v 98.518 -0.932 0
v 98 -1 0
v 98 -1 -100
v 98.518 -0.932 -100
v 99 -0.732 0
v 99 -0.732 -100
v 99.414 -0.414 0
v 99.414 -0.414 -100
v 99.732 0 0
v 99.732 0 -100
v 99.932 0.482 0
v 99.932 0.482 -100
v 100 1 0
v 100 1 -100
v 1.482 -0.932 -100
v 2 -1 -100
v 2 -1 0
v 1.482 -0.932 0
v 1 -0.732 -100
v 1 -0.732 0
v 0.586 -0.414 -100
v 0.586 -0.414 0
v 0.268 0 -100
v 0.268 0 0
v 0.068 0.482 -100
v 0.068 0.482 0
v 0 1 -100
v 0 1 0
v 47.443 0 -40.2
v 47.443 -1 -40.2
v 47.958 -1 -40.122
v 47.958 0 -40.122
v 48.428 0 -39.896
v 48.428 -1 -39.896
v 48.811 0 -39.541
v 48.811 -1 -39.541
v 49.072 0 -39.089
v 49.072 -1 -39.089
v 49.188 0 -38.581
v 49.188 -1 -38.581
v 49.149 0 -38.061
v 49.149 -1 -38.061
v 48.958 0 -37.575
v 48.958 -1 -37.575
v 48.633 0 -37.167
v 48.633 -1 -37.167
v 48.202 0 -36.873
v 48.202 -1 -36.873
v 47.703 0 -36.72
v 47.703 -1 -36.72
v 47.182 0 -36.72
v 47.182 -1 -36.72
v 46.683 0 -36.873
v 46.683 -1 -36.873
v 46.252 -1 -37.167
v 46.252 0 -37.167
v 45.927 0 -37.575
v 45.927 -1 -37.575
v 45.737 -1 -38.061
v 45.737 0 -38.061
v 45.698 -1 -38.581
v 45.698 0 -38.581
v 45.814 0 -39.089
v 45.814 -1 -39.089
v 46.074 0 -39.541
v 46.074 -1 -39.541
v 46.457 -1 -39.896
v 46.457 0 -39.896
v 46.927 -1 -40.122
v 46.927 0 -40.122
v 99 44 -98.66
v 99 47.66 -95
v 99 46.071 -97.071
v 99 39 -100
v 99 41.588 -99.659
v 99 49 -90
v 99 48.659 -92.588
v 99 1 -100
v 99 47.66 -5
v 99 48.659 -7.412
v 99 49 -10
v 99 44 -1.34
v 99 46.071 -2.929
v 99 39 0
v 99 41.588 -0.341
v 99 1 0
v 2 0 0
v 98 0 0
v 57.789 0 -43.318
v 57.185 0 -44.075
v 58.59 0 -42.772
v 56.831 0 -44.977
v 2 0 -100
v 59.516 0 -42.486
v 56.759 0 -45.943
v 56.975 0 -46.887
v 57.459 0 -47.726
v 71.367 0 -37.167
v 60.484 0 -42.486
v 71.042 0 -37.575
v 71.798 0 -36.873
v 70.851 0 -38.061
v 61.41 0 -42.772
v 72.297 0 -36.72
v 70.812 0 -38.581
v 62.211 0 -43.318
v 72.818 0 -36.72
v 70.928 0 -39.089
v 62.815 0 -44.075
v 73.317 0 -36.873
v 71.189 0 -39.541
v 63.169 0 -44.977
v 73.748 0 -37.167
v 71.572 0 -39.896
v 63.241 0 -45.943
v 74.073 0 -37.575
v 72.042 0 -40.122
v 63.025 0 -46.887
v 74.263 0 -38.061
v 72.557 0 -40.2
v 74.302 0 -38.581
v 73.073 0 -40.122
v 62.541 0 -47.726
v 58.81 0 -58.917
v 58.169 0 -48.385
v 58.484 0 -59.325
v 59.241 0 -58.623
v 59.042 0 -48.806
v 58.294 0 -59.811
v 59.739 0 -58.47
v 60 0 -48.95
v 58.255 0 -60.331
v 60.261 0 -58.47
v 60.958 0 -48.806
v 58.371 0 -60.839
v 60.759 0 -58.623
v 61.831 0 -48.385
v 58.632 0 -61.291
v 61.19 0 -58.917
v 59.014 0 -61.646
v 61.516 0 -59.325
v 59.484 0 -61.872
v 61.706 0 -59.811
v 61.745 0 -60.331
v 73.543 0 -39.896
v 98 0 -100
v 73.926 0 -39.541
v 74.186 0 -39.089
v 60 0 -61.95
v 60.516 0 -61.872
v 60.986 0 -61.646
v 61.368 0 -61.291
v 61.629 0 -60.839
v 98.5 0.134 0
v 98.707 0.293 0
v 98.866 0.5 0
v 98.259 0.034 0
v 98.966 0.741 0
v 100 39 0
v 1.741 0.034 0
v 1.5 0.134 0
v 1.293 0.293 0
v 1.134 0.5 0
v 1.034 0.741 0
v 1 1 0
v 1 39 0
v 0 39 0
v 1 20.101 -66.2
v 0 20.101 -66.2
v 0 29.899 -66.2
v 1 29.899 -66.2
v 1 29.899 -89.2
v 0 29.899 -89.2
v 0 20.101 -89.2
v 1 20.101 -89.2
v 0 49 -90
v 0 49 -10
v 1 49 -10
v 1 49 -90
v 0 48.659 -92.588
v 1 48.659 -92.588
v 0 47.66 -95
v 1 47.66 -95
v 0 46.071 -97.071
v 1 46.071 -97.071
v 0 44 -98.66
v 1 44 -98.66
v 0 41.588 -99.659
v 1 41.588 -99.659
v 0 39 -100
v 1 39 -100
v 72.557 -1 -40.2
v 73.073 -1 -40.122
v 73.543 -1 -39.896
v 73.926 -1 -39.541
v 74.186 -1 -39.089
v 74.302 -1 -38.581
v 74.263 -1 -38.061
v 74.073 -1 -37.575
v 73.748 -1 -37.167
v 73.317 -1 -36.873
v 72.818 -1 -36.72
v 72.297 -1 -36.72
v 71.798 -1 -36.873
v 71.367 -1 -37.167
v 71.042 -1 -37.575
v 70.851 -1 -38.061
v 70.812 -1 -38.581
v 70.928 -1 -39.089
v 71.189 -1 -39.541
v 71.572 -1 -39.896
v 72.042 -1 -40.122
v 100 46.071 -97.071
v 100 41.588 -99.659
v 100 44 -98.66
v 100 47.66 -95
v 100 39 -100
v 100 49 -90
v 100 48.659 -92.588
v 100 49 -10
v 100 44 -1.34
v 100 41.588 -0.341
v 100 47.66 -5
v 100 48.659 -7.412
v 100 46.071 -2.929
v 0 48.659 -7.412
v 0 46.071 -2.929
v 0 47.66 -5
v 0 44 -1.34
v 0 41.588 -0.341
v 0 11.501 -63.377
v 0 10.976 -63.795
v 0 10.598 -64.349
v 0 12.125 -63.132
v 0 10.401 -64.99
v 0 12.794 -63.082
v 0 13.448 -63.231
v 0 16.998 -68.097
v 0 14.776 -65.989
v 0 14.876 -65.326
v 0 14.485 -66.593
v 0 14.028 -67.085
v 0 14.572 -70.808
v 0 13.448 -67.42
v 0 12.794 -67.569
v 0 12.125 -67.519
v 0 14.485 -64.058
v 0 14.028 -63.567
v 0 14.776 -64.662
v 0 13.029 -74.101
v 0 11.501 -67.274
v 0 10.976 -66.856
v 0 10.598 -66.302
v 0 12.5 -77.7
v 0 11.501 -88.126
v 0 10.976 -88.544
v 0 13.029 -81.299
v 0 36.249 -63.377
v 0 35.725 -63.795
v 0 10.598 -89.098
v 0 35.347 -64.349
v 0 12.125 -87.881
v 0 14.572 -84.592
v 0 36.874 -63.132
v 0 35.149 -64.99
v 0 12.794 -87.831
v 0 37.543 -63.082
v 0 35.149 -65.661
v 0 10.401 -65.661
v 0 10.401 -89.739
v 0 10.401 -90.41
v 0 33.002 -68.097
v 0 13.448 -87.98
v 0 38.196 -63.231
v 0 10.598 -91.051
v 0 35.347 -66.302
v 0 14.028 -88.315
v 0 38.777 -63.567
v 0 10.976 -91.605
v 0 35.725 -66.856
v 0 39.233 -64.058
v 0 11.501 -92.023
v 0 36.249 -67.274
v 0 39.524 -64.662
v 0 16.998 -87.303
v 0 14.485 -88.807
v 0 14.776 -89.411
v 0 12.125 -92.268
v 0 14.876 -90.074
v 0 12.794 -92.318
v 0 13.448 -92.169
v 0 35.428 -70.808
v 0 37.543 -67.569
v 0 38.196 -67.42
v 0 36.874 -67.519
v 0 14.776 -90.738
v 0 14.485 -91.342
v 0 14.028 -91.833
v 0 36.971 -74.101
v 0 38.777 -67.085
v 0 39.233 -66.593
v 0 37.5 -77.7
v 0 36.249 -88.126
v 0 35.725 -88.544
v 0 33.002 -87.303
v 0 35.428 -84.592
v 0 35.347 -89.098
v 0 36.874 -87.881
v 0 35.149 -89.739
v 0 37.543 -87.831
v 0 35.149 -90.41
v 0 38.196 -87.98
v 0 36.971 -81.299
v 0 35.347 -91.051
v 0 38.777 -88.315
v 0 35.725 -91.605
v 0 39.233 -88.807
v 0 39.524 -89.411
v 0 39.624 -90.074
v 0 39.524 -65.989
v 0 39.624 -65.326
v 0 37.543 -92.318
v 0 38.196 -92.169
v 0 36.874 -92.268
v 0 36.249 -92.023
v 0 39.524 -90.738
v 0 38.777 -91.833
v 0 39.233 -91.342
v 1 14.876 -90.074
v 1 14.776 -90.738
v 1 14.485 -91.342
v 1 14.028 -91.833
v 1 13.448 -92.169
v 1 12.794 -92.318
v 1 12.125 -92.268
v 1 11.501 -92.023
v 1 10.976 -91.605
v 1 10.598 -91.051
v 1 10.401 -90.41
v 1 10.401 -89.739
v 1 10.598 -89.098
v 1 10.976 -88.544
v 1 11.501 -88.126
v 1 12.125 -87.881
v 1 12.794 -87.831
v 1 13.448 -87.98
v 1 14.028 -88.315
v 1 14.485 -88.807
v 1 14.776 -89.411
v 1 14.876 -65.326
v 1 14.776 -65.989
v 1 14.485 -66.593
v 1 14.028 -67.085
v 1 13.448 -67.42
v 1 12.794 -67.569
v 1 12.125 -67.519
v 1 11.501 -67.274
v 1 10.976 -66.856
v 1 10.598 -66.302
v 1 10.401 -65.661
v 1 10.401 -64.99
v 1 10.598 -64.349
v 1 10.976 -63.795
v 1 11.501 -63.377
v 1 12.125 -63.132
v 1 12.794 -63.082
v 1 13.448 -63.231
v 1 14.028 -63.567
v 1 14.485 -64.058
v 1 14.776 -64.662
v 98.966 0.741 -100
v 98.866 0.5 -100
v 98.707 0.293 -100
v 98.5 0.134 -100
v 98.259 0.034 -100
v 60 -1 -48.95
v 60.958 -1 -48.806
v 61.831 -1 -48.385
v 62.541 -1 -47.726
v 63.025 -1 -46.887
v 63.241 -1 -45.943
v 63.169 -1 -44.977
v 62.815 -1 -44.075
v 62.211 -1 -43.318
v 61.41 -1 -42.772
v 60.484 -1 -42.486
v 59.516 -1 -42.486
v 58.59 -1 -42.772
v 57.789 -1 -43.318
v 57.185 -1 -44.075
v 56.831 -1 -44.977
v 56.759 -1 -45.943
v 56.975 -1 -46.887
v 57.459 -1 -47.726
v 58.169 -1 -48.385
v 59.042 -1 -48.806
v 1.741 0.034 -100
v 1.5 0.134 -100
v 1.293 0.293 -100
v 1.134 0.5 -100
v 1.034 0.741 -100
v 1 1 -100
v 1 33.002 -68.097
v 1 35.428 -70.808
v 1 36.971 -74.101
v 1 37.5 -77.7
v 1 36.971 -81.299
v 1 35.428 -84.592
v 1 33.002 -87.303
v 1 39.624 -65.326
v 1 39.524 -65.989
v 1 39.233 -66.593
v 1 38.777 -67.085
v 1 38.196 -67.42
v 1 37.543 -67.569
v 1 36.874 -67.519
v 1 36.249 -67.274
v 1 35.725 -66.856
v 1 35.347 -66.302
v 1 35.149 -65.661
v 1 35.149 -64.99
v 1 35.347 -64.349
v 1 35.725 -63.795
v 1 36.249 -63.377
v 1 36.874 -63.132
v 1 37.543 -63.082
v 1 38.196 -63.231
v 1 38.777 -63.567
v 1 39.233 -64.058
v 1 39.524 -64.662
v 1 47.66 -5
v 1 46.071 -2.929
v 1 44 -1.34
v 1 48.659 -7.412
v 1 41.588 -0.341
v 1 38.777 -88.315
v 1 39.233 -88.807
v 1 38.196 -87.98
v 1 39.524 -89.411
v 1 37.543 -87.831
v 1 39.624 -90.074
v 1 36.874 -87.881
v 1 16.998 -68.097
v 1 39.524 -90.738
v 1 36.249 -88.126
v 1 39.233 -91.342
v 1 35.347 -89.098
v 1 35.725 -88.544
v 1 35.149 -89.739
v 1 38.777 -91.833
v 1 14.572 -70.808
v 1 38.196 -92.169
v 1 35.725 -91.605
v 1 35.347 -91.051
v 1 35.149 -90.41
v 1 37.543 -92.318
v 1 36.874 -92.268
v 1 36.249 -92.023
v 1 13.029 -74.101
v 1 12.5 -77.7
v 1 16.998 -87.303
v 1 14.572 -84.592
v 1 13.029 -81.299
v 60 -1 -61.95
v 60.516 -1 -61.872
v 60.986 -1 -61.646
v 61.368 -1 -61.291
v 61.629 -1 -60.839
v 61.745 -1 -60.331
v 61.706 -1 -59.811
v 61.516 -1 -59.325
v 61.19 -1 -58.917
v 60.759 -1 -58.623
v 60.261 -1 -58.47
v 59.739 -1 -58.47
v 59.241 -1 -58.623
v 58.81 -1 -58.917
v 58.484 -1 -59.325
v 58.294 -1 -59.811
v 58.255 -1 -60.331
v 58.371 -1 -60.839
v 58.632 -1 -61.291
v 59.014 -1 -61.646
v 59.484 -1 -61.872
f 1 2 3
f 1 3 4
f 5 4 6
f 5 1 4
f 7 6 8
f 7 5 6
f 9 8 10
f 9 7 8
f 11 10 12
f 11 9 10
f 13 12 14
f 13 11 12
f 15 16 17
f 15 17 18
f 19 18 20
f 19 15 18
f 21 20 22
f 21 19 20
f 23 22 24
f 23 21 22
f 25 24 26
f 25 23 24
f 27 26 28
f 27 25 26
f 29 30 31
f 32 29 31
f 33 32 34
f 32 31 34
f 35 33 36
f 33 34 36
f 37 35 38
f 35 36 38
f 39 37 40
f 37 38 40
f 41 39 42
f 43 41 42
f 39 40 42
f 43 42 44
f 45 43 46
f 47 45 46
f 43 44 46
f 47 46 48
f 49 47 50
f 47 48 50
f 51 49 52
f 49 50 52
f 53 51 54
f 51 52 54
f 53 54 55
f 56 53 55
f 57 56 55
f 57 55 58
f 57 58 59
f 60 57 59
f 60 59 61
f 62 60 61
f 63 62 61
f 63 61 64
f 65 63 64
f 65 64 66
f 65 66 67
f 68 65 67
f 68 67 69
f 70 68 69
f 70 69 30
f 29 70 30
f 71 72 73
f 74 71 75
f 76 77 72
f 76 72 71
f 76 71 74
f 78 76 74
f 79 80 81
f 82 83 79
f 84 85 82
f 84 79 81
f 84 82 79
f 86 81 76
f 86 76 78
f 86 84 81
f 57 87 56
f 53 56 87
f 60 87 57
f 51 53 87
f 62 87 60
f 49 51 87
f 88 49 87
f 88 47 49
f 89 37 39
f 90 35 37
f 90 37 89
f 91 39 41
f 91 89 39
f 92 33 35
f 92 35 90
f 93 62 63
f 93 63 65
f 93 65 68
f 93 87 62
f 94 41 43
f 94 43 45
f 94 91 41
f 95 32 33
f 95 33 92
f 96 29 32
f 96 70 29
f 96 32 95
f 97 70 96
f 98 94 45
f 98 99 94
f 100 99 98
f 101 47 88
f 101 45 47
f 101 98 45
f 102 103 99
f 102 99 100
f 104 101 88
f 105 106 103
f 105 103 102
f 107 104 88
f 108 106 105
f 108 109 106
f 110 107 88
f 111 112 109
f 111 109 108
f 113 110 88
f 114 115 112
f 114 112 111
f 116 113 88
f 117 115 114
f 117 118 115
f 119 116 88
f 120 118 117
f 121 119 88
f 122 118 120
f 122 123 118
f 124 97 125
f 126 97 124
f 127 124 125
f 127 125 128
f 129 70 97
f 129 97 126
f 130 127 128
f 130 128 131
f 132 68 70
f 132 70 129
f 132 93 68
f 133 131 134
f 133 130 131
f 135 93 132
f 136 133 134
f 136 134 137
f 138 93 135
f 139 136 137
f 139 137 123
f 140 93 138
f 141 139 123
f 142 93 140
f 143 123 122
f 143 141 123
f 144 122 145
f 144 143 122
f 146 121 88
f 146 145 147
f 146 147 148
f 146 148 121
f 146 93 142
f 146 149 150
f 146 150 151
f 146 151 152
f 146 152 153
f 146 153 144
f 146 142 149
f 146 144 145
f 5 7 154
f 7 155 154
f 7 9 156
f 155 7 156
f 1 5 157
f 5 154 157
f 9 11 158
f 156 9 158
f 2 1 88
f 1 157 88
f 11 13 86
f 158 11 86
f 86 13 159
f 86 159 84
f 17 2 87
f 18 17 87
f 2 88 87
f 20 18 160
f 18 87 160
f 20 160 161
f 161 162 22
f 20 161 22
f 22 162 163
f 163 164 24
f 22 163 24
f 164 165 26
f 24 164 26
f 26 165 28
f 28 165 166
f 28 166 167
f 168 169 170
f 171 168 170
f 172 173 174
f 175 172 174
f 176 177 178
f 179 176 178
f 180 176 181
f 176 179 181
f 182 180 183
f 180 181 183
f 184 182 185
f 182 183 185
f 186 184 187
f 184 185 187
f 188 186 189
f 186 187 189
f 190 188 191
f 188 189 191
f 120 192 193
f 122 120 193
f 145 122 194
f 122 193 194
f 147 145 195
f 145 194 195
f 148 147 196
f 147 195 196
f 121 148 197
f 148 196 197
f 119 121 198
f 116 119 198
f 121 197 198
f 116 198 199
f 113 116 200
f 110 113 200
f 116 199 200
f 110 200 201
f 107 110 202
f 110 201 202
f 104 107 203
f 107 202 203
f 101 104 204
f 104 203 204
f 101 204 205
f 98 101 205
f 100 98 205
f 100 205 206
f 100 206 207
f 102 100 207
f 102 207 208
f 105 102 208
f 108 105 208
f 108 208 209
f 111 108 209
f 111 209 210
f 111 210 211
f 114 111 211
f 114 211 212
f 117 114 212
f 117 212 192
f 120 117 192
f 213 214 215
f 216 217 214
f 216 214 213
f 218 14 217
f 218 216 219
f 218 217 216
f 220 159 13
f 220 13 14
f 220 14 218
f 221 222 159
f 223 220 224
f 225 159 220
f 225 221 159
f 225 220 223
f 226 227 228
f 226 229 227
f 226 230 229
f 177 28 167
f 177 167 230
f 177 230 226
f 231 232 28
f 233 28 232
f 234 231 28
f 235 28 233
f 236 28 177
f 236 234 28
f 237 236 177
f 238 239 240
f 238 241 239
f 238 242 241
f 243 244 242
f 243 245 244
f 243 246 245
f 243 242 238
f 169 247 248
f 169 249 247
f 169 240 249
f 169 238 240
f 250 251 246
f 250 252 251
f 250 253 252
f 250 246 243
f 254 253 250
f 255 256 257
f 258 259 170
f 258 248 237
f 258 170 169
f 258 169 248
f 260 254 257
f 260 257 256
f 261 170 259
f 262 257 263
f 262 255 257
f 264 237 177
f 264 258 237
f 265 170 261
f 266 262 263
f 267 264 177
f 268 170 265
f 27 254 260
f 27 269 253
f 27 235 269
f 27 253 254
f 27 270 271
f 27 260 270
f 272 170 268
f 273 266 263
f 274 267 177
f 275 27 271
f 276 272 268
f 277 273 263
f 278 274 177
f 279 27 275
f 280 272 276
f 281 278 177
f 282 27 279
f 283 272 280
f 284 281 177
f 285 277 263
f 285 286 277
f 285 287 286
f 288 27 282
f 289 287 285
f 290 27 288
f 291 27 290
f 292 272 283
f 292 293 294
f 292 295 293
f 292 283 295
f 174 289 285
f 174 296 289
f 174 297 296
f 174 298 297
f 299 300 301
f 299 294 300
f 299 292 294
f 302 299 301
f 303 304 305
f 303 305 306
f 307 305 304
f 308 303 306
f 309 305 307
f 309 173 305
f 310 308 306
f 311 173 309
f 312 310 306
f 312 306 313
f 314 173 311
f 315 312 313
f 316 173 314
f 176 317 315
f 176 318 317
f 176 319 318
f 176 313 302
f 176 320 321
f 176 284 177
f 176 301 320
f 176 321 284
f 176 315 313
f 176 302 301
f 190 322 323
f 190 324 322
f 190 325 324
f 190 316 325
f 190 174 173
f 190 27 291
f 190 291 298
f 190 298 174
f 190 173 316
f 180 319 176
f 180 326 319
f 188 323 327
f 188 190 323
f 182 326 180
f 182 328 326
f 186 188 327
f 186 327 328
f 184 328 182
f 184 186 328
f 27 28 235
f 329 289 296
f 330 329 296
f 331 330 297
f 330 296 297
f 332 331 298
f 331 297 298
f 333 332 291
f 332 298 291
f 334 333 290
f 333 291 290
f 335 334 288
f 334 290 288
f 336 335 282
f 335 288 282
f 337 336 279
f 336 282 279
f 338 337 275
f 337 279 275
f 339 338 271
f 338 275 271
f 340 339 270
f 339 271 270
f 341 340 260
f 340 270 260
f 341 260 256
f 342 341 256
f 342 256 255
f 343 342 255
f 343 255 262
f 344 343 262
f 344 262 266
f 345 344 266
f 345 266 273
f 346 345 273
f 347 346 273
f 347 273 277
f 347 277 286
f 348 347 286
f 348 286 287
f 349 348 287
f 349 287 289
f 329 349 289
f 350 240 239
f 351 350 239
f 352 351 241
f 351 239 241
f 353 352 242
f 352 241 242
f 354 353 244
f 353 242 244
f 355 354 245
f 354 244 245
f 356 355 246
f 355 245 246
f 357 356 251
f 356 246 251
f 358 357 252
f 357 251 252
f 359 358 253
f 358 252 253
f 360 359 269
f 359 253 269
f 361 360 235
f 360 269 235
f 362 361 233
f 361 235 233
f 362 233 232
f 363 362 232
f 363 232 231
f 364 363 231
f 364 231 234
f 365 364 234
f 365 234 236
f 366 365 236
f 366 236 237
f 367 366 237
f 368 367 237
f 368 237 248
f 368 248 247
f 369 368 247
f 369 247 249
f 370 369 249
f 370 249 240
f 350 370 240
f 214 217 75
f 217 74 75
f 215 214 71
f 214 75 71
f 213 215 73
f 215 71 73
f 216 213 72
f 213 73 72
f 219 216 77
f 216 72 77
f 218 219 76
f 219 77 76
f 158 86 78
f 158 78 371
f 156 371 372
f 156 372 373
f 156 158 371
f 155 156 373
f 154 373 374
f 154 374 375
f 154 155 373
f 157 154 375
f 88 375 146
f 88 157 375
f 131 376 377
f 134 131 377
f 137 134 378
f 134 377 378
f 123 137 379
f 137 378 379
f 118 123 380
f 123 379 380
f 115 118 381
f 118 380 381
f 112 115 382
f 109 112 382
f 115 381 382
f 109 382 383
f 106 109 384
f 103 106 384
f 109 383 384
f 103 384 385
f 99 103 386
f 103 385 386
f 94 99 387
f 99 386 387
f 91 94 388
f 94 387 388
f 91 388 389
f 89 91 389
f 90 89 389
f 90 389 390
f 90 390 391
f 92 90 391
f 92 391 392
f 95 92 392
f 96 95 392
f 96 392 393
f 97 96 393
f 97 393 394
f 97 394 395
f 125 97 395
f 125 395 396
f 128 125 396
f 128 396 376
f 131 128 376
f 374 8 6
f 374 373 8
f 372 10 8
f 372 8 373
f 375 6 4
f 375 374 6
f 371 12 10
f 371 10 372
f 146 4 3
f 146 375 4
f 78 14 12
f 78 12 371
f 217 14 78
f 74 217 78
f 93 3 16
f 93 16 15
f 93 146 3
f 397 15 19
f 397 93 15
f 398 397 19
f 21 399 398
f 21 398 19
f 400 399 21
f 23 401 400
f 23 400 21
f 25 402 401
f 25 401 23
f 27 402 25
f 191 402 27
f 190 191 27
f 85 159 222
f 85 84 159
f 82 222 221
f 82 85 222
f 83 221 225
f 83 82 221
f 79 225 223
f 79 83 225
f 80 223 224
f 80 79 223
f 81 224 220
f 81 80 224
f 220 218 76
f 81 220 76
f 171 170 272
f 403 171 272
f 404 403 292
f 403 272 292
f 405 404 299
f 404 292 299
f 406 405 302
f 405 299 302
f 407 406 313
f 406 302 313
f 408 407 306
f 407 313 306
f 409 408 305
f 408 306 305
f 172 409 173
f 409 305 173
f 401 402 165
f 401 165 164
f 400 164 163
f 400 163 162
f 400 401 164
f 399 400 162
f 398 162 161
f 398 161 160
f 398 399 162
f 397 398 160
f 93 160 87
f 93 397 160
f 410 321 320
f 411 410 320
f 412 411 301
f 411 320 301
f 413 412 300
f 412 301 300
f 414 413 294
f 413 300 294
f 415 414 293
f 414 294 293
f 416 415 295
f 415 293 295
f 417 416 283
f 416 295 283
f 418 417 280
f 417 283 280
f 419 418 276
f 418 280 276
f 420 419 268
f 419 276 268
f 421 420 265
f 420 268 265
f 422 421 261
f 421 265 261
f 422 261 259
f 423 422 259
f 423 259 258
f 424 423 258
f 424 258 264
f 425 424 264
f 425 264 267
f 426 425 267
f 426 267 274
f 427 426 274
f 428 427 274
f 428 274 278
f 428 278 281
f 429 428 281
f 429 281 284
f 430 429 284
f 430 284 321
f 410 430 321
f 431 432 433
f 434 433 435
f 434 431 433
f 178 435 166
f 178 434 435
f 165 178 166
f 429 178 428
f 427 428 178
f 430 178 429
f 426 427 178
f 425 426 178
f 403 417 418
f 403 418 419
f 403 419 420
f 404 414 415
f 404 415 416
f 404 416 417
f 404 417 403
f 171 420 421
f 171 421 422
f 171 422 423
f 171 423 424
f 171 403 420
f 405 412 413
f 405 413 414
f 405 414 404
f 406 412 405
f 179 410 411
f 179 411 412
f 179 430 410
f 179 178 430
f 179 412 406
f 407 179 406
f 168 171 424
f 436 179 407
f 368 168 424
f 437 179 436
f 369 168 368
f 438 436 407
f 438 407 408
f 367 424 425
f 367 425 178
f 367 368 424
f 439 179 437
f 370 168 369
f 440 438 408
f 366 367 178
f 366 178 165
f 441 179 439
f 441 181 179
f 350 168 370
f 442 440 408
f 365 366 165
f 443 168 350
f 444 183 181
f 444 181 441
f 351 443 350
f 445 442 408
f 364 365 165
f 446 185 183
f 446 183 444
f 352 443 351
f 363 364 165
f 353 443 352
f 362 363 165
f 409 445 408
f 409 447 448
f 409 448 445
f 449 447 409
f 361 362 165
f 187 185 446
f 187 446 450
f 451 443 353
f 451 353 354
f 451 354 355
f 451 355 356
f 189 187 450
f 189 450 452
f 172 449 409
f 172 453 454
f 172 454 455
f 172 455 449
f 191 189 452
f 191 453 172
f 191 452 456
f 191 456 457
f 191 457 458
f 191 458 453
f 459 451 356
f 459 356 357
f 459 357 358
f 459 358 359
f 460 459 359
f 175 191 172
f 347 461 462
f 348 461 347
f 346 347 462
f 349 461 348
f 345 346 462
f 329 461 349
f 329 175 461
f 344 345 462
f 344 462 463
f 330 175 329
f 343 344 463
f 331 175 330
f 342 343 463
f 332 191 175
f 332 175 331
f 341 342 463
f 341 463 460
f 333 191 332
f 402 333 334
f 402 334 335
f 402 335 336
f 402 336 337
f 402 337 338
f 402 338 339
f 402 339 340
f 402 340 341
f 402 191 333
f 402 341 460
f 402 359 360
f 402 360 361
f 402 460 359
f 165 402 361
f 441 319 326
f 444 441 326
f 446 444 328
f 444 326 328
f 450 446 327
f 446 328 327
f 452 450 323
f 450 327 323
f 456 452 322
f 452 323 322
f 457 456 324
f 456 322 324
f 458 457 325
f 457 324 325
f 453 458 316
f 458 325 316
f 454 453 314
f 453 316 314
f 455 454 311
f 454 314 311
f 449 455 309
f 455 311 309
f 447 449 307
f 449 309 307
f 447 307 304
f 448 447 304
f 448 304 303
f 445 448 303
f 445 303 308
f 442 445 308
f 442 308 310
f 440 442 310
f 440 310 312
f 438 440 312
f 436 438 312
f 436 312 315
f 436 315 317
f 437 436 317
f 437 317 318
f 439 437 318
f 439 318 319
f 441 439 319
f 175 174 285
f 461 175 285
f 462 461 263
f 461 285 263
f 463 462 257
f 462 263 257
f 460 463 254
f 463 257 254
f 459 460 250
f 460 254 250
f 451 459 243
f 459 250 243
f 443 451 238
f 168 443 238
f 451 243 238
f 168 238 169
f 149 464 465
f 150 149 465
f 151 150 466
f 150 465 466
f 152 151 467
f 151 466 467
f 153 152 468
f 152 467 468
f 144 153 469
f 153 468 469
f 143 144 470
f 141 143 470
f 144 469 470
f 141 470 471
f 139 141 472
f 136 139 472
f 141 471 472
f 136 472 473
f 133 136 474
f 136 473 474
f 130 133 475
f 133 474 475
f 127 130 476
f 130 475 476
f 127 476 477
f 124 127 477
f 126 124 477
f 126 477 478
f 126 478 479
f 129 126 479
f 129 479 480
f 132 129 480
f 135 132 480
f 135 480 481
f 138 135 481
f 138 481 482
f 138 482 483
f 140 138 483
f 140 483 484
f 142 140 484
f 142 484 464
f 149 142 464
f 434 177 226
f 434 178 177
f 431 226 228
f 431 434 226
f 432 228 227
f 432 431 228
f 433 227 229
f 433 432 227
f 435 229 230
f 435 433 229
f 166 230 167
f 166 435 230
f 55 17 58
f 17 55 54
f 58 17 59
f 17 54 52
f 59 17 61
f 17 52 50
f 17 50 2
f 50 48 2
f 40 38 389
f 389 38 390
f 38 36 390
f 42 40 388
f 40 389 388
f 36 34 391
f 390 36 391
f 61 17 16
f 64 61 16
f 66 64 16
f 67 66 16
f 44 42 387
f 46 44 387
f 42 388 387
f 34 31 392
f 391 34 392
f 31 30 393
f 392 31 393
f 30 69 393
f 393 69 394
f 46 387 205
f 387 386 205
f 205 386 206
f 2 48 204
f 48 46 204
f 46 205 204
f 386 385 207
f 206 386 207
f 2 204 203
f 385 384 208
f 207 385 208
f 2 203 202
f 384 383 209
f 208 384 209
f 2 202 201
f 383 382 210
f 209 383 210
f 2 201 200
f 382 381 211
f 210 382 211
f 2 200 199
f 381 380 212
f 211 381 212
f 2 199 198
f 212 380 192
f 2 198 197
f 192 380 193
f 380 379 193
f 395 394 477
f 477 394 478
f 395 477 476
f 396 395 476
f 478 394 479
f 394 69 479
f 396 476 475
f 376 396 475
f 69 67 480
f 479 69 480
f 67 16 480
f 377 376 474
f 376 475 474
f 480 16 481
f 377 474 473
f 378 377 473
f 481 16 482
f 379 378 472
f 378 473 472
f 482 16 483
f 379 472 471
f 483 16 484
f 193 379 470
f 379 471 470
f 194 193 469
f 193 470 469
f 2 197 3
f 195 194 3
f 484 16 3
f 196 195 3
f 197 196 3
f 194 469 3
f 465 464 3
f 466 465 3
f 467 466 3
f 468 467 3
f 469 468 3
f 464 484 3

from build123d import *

# Parameters (mm, degrees)
SKETCH1_W                    = 100
SKETCH1_H                    = 100
BASE_FLANGE1_DEPTH           = 1
EDGE_FLANGE1_STRIP_W         = 6
EDGE_FLANGE1_STRIP_H         = 1
EDGE_FLANGE1_STRIP_CUT_DEPTH = 100
EDGE_FLANGE1_DEPTH           = 100
EDGE_FLANGE2_STRIP_W         = 6
EDGE_FLANGE2_STRIP_H         = 1
EDGE_FLANGE2_STRIP_CUT_DEPTH = 100
EDGE_FLANGE2_DEPTH           = 100
FILLET1_R                    = 10
SKETCH12_R                   = 2.25
CUT_EXTRUDE1_DEPTH           = 10
SKETCH13_R                   = 3.25
SKETCH13_R_2                 = 1.75
CUT_EXTRUDE2_DEPTH           = 8


# Sheet-metal steps are written as plain solids
with BuildPart() as part:
    # Sketch1 → Base-Flange1 (new body)
    with BuildSketch(Plane(origin=(0, 0, 0), x_dir=(1, 0, 0), z_dir=(0, 1, 0))):
        with Locations((50, 50)):
            Rectangle(SKETCH1_W, SKETCH1_H)
    extrude(amount=-BASE_FLANGE1_DEPTH)

    # Edge-Flange1 strip (across the edge) → Edge-Flange1 strip cut (cut)
    with BuildSketch(Plane(origin=(100, 0, 0), x_dir=(-1, 0, 0), z_dir=(0, 0, -1))):
        with Locations((-1, -0.5)):
            Rectangle(EDGE_FLANGE1_STRIP_W, EDGE_FLANGE1_STRIP_H)
    extrude(amount=EDGE_FLANGE1_STRIP_CUT_DEPTH, mode=Mode.SUBTRACT)

    # Edge-Flange1 section (across the edge) → Edge-Flange1 (add)
    with BuildSketch(Plane(origin=(100, 0, 0), x_dir=(-1, 0, 0), z_dir=(0, 0, -1))):
        with BuildLine():
            Line((0, 1), (0, 49))
            Line((0, 49), (1, 49))
            Line((1, 49), (1, 1))
            ThreePointArc((1, 1), (1.292893219, 0.292893219), (2, 0))
            Line((2, 0), (2, -1))
            ThreePointArc((2, -1), (0.585786438, -0.414213562), (0, 1))
        make_face()
    extrude(amount=EDGE_FLANGE1_DEPTH)

    # Edge-Flange2 strip (across the edge) → Edge-Flange2 strip cut (cut)
    with BuildSketch(Plane.XY.offset(-100)):
        with Locations((-1, -0.5)):
            Rectangle(EDGE_FLANGE2_STRIP_W, EDGE_FLANGE2_STRIP_H)
    extrude(amount=EDGE_FLANGE2_STRIP_CUT_DEPTH, mode=Mode.SUBTRACT)

    # Edge-Flange2 section (across the edge) → Edge-Flange2 (add)
    with BuildSketch(Plane.XY.offset(-100)):
        with BuildLine():
            Line((0, 1), (0, 49))
            Line((0, 49), (1, 49))
            Line((1, 49), (1, 1))
            ThreePointArc((1, 1), (1.292893219, 0.292893219), (2, 0))
            Line((2, 0), (2, -1))
            ThreePointArc((2, -1), (0.585786438, -0.414213562), (0, 1))
        make_face()
    extrude(amount=EDGE_FLANGE2_DEPTH)

    # Fillet1
    fillet1_edges = [part.edges().sort_by_distance(p)[0] for p in [
        (99.5, 49, 0),
        (99.5, 49, -100),
        (0.5, 49, -100),
        (0.5, 49, 0),
    ]]
    fillet(fillet1_edges, radius=FILLET1_R)

    # Sketch12 → Cut-Extrude1 (cut)
    with BuildSketch(Plane(origin=(-1, -31.373526732, -102.532454166), x_dir=(0, 0, 1), z_dir=(-1, 0, 0))):
        with BuildLine():
            ThreePointArc((36.332454166, 61.272506218), (24.832454166, 68.873526732), (13.332454166, 61.272506218))
            Line((13.332454166, 61.272506218), (13.332454166, 51.474547246))
            ThreePointArc((13.332454166, 51.474547246), (24.832454166, 43.873526732), (36.332454166, 51.474547246))
            Line((36.332454166, 51.474547246), (36.332454166, 61.272506218))
        make_face()
        with Locations(Location((12.458085495, 68.747895403, 0), (0, 0, 90))):
            Circle(SKETCH12_R)
        with Locations(Location((37.206822836, 68.747895403, 0), (0, 0, 90))):
            Circle(SKETCH12_R)
        with Locations(Location((37.206822836, 43.999158061, 0), (0, 0, 90))):
            Circle(SKETCH12_R)
        with Locations(Location((12.458085495, 43.999158061, 0), (0, 0, 90))):
            Circle(SKETCH12_R)
    extrude(amount=-CUT_EXTRUDE1_DEPTH, mode=Mode.SUBTRACT)

    # Sketch13 → Cut-Extrude2 (cut)
    with BuildSketch(Plane(origin=(17.313345769, -1, -102.532454166), x_dir=(1, 0, 0), z_dir=(0, -1, 0))):
        with Locations(Location((42.686654231, 56.832454166, 0), (0, 0, 270))):
            Circle(SKETCH13_R)
        with Locations(Location((30.129285876, 64.082454166, 0), (0, 0, 270))):
            Circle(SKETCH13_R_2)
        with Locations(Location((55.244022586, 64.082454166, 0), (0, 0, 270))):
            Circle(SKETCH13_R_2)
        with Locations(Location((42.686654231, 42.332454166, 0), (0, 0, 270))):
            Circle(SKETCH13_R_2)
    extrude(amount=-CUT_EXTRUDE2_DEPTH, mode=Mode.SUBTRACT)


solid = part.part
